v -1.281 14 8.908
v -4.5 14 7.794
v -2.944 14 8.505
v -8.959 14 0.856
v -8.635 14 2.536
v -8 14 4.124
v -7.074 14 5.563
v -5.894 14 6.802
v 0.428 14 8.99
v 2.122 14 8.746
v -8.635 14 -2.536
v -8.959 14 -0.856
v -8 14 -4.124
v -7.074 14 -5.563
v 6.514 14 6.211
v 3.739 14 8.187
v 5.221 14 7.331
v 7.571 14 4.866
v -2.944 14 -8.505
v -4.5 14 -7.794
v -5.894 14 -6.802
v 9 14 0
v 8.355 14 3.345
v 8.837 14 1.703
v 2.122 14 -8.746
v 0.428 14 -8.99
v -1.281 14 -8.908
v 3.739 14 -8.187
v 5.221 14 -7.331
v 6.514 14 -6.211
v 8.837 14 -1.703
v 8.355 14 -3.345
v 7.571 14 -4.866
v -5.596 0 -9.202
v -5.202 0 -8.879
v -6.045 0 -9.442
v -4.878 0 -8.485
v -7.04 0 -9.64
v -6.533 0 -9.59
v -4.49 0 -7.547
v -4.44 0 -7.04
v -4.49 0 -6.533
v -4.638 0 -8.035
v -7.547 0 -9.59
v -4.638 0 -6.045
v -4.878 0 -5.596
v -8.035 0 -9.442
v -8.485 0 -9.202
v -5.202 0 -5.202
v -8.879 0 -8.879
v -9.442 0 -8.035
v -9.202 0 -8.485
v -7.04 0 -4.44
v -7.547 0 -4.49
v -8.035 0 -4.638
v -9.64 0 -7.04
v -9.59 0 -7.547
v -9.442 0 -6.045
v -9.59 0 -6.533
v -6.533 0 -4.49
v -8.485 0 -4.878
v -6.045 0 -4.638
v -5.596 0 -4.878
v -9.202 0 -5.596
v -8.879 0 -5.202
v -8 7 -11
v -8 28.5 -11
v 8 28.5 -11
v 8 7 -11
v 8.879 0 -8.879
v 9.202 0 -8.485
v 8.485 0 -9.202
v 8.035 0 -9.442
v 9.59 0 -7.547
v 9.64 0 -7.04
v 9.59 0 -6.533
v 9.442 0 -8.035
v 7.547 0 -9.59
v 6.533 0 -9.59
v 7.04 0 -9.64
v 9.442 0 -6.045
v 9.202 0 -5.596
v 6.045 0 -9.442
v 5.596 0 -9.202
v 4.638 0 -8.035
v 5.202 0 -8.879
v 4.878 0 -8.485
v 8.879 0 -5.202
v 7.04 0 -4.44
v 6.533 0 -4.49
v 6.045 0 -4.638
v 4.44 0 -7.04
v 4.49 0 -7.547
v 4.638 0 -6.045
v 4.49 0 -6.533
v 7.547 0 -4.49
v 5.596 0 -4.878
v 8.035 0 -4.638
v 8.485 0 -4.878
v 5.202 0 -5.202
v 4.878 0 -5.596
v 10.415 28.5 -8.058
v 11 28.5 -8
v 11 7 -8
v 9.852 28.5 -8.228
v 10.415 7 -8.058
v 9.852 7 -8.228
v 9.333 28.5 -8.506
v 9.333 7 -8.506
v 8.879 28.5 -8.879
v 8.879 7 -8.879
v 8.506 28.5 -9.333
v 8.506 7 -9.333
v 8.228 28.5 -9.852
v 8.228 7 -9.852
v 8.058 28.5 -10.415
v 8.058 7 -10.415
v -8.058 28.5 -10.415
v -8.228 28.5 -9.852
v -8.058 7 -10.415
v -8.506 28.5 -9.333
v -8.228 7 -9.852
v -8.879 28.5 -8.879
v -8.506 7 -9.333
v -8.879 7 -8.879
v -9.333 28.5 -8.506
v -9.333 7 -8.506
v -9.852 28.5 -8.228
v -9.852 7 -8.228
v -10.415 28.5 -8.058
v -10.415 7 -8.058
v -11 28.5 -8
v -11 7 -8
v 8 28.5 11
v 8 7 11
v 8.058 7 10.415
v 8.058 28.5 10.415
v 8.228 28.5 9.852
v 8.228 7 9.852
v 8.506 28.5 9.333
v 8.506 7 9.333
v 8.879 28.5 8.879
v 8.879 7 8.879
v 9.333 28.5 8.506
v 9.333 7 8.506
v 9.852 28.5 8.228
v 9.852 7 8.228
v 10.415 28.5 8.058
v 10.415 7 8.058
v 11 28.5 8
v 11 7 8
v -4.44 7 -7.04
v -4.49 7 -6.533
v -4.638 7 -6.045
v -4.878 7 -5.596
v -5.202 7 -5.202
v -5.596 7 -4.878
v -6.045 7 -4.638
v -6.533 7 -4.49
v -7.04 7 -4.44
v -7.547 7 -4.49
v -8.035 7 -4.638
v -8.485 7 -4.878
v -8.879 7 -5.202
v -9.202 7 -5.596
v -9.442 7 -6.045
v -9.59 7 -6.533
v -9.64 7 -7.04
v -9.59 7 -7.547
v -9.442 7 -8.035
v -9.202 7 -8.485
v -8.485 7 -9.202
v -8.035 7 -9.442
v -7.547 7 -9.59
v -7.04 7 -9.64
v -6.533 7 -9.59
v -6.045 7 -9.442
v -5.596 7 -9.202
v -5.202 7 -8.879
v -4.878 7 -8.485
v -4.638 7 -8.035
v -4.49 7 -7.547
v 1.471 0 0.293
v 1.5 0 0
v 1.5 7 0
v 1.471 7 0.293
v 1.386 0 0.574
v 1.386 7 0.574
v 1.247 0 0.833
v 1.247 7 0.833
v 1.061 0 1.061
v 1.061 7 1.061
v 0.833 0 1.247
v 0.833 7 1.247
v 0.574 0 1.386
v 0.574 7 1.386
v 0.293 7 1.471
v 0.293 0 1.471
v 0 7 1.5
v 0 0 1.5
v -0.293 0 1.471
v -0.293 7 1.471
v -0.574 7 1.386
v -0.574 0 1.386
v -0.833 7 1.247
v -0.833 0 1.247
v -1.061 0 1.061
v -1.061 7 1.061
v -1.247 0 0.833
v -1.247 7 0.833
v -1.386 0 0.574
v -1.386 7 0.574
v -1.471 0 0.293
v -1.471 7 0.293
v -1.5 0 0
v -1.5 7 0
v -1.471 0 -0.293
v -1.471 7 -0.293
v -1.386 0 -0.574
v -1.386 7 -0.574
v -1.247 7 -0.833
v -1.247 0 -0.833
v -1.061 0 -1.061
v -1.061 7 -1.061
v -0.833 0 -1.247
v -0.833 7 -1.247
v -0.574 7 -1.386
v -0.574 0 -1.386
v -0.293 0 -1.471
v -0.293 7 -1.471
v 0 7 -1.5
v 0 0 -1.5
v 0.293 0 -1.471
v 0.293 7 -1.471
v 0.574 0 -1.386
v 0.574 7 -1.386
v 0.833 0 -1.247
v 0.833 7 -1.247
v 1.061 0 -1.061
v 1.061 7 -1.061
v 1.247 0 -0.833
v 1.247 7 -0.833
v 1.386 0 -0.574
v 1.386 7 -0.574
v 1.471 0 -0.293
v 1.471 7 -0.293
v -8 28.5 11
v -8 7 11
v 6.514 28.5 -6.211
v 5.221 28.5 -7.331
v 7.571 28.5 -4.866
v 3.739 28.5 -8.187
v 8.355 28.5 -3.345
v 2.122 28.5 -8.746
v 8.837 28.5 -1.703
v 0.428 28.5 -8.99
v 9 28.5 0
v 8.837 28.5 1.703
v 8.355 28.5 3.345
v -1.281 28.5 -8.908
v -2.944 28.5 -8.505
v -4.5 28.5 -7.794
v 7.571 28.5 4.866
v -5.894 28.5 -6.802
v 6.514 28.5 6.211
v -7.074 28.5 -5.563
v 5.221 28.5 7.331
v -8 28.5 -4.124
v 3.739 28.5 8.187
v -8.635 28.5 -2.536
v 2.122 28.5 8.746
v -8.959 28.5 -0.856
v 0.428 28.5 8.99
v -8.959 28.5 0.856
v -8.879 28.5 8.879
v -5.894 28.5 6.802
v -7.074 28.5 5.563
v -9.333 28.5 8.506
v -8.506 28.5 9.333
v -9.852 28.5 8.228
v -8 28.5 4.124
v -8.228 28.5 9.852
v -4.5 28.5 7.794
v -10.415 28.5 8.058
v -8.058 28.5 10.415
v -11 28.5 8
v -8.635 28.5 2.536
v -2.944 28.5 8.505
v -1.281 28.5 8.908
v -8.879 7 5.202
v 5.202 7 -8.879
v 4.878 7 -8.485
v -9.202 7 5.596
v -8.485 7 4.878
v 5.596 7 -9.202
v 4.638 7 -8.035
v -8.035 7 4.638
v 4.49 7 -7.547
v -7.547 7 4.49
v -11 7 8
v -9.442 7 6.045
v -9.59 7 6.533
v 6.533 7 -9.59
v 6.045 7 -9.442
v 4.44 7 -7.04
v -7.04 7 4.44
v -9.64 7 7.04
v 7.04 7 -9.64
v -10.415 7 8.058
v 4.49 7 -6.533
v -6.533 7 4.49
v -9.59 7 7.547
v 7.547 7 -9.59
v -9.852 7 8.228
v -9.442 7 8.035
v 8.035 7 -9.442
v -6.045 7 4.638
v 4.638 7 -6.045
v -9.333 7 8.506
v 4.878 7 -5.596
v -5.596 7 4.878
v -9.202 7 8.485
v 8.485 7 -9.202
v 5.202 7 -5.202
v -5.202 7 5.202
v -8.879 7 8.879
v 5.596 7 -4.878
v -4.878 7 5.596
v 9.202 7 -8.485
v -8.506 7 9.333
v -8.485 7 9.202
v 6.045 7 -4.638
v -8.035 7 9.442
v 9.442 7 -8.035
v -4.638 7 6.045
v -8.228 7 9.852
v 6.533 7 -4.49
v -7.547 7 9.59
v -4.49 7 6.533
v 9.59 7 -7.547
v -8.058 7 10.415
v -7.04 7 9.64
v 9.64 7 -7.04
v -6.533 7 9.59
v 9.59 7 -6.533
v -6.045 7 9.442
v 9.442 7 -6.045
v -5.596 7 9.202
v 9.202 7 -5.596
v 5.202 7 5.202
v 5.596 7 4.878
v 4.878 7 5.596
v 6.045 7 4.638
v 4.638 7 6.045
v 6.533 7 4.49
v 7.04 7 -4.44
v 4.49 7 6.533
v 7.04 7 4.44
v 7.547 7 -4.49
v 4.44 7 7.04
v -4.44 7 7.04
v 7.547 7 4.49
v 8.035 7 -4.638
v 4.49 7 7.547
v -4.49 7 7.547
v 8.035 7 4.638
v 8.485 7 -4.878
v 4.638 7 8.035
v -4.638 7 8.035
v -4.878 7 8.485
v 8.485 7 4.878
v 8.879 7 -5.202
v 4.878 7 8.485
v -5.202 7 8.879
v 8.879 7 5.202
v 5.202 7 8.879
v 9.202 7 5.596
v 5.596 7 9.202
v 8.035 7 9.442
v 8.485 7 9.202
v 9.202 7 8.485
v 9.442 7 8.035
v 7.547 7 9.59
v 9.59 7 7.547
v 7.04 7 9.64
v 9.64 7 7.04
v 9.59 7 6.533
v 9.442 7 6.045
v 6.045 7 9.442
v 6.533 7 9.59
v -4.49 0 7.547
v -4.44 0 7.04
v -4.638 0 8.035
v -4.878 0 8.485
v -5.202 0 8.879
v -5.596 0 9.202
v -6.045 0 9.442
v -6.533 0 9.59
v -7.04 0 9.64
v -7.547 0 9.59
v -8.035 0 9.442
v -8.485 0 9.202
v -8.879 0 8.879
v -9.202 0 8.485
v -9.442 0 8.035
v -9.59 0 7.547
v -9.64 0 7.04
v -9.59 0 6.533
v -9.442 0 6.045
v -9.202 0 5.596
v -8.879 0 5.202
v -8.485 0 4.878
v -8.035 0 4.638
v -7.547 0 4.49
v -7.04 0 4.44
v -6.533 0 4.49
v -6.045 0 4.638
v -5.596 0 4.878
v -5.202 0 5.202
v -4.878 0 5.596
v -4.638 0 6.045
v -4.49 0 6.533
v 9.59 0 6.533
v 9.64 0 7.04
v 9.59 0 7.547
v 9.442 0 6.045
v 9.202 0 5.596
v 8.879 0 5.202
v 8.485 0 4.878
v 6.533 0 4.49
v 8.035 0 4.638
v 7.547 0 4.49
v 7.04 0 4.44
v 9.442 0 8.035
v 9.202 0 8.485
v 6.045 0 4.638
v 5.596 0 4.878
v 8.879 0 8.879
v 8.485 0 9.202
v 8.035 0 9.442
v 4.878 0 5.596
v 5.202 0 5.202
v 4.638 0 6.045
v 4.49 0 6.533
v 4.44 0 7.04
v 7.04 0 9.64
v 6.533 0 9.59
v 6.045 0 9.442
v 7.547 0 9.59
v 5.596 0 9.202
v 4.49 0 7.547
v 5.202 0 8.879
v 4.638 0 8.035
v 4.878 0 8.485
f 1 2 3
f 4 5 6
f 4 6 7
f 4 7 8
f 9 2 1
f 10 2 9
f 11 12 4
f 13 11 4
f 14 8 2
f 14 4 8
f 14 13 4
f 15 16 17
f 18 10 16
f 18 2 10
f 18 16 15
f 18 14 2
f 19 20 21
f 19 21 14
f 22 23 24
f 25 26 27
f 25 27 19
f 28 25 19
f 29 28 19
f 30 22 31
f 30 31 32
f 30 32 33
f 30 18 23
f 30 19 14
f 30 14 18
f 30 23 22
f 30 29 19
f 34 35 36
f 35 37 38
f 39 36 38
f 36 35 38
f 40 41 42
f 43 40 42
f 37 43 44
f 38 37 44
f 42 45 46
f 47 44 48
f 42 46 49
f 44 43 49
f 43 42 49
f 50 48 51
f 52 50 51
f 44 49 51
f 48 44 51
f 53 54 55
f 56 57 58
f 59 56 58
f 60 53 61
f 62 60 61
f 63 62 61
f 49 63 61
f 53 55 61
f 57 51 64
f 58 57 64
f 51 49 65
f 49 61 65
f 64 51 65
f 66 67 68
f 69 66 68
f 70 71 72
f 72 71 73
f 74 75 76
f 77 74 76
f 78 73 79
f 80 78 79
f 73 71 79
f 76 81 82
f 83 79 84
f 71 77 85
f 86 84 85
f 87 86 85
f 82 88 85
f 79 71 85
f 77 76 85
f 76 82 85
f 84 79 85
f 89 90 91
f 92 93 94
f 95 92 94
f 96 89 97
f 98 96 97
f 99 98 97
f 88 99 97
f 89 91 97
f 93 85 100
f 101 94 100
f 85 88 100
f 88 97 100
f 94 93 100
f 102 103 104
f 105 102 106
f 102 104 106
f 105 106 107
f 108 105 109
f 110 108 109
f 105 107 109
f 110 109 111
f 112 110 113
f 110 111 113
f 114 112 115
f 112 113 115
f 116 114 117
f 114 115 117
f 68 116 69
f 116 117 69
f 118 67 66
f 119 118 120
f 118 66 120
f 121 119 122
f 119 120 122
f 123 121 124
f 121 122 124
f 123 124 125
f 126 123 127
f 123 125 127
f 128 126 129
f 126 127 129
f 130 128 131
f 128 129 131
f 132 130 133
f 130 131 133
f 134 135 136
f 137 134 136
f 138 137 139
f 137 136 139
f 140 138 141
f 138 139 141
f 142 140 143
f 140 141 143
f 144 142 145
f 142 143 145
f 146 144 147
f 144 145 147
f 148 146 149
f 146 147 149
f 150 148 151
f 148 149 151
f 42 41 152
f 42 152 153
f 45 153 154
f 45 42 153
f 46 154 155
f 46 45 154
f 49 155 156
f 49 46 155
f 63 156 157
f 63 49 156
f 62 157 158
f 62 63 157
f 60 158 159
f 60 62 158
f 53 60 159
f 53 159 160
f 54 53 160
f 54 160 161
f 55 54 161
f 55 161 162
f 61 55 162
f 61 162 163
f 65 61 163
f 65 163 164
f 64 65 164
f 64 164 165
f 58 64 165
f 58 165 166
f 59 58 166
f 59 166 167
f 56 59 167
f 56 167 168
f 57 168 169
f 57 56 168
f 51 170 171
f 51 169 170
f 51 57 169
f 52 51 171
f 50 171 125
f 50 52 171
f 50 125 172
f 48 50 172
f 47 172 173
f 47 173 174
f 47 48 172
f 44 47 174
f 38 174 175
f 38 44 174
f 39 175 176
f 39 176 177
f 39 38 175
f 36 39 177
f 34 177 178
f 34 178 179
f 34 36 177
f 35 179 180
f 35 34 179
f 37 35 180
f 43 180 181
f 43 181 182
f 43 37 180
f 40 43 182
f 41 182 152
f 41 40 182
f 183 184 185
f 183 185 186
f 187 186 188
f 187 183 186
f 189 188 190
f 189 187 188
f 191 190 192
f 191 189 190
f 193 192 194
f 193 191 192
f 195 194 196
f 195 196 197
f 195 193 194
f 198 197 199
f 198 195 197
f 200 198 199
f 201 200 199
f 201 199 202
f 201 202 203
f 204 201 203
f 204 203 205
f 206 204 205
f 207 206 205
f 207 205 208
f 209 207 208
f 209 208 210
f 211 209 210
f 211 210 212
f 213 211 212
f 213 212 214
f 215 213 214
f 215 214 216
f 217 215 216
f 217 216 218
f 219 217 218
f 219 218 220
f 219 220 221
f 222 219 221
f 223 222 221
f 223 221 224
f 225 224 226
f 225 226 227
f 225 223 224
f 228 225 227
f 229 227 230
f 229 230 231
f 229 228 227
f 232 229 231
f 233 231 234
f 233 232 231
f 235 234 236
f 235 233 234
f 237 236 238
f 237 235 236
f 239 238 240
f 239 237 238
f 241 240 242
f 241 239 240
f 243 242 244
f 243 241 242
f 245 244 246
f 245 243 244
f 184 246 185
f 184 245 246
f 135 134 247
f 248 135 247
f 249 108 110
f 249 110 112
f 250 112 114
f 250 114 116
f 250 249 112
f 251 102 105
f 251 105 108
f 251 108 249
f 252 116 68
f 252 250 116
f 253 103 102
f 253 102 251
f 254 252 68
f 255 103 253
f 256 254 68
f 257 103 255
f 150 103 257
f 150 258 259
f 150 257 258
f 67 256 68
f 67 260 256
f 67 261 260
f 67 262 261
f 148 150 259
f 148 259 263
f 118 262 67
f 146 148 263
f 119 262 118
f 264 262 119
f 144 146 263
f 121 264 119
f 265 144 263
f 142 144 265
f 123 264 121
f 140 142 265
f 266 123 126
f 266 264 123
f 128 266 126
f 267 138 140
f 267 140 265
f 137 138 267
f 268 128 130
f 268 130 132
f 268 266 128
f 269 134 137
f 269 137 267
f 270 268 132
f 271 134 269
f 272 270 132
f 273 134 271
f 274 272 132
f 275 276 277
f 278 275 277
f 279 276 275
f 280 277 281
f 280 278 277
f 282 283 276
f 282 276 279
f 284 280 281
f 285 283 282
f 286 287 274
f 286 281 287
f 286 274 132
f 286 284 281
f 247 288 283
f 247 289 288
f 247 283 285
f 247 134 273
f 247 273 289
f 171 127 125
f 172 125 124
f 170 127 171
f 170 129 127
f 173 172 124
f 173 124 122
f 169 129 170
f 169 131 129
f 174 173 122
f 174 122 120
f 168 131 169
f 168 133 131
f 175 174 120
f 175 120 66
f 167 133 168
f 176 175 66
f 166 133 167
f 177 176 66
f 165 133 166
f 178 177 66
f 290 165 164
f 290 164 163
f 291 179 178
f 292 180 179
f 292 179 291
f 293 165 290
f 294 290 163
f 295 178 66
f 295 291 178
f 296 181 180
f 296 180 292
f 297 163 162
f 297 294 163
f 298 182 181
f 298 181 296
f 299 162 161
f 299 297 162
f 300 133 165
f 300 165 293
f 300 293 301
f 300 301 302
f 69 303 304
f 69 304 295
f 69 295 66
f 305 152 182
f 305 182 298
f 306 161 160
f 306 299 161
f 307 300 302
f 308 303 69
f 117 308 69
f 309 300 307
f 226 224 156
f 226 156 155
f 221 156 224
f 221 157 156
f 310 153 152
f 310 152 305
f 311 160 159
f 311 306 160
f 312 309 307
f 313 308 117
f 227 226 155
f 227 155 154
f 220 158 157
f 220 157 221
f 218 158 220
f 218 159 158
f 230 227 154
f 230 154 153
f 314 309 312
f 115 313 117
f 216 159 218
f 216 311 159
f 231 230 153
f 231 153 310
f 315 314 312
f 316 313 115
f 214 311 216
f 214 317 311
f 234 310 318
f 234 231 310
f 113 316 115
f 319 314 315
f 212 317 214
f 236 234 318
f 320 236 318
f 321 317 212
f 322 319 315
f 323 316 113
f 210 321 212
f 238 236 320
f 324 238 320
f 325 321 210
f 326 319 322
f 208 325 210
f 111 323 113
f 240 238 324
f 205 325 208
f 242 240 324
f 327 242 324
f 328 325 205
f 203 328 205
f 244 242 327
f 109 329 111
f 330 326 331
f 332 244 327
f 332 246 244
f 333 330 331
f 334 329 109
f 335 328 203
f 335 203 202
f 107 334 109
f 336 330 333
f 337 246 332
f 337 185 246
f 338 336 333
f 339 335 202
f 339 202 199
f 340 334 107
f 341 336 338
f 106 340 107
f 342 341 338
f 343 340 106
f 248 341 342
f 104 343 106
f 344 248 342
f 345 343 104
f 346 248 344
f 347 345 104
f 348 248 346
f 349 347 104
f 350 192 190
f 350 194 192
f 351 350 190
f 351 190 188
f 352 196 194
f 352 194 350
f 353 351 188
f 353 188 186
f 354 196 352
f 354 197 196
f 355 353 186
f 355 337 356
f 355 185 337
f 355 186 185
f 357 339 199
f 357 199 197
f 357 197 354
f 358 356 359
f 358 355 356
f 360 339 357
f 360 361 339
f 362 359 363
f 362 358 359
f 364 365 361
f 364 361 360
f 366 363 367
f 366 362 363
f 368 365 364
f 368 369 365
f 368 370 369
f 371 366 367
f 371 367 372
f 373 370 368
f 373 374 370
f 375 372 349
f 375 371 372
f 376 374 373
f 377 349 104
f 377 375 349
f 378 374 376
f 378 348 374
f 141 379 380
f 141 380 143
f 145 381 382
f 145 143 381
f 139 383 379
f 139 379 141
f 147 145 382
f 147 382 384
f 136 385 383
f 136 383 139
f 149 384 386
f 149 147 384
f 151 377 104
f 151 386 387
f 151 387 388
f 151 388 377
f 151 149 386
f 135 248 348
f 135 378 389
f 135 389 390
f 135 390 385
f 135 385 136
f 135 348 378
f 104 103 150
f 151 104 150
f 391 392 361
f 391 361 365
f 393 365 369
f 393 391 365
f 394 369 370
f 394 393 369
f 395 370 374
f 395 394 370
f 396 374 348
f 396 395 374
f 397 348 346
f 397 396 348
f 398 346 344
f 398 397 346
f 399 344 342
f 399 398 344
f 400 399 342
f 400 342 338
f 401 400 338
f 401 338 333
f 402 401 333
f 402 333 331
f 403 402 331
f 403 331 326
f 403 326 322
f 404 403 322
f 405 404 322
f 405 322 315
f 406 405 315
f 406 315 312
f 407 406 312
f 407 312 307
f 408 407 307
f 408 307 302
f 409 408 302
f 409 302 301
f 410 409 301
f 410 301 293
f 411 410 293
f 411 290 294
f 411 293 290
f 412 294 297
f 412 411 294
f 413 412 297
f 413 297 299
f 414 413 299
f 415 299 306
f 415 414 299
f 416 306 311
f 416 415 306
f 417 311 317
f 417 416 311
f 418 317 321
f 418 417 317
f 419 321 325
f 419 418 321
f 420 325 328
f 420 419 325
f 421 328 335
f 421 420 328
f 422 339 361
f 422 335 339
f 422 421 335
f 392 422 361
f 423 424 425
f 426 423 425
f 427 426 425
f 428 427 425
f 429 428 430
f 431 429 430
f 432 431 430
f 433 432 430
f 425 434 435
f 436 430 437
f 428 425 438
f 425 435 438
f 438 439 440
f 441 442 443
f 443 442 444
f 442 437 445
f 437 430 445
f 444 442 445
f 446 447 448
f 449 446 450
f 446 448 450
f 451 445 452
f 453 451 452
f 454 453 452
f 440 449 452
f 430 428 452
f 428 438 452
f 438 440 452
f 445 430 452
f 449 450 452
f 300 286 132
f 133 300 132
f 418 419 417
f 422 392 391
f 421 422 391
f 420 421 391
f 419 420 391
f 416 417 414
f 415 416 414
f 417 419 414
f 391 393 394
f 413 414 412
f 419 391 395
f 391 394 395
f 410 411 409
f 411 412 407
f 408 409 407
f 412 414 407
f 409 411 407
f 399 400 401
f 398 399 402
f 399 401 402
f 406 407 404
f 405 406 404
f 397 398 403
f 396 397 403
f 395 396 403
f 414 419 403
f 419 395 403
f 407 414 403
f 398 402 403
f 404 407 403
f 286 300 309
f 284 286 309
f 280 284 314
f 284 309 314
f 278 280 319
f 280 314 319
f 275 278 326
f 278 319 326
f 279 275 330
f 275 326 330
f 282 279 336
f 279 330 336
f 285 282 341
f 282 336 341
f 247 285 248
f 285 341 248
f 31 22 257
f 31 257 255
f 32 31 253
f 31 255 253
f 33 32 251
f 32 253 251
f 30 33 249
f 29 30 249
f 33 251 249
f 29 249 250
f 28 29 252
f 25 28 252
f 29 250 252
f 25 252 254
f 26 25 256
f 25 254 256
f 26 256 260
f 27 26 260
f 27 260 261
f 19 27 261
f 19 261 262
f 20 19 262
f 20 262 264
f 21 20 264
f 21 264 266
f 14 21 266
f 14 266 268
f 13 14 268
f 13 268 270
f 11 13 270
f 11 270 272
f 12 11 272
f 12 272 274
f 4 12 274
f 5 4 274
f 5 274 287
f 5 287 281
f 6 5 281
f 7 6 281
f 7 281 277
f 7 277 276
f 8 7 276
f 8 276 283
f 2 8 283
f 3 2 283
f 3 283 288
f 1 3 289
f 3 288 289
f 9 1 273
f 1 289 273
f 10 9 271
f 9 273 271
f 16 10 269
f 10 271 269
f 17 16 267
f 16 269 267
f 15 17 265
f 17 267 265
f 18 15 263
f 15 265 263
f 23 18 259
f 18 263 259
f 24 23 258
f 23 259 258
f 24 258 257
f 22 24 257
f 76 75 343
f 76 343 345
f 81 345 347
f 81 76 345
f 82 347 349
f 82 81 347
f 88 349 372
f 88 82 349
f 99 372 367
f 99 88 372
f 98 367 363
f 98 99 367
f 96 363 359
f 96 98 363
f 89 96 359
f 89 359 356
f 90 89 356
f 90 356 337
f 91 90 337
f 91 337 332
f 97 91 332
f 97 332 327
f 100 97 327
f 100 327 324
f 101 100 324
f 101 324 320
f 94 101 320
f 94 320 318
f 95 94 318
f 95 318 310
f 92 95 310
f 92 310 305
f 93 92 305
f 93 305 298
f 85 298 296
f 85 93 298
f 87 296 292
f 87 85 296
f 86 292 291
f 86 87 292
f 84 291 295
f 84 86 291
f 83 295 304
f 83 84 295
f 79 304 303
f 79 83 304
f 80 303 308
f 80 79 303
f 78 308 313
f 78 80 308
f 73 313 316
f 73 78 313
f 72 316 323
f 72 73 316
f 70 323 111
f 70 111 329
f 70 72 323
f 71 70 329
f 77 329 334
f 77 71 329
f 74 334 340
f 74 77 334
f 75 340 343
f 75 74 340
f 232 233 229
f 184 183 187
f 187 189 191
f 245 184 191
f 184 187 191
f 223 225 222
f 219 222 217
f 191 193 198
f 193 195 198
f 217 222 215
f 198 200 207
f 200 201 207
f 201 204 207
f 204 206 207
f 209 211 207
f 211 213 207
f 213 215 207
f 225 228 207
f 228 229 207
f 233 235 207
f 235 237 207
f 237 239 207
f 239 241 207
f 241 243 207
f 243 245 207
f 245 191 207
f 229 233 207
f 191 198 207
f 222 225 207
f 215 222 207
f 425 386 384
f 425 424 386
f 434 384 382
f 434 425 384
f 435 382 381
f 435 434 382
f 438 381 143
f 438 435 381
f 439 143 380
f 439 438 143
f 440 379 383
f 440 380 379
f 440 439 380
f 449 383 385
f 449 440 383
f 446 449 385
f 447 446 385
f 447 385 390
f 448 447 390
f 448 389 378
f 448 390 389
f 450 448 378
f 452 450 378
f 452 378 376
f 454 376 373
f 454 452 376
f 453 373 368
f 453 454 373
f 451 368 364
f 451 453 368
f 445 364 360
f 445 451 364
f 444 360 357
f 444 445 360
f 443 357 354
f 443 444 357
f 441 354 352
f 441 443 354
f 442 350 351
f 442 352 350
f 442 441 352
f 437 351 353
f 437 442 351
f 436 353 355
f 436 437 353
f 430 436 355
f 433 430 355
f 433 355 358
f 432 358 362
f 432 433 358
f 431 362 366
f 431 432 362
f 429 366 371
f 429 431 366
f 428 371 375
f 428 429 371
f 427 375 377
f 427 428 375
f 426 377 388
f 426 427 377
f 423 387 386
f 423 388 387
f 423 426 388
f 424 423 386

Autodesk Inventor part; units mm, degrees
ref_plane "YZ Plane" through (0, 0, 0) normal (1, 0, 0) x (0, 1, 0)
ref_plane "XZ Plane" through (0, 0, 0) normal (0, 1, 0) x (-1, 0, 0)
ref_plane "XY Plane" through (0, 0, 0) normal (0, 0, 1) x (1, 0, 0)
sketch "Sketch1" plane through (0, 0, 0) normal (0, 1, 0) x (-1, 0, 0)
  line L0 (-11, 11) -> (11, 11)
  line L1 (11, 11) -> (11, -11)
  line L2 (11, -11) -> (-11, -11)
  line L3 (-11, -11) -> (-11, 11)
  line L4 (-11, 11) -> (11, -11) construction
  line L5 (11, 11) -> (-11, -11) construction
  point P0 (0, 0)
  dimension "d0" = 22
  dimension "d1" = 22
extrude "Extrusion1" add sketch "Sketch1" along normal blind 28.5
sketch "Sketch2" plane through (0, 28.5, 0) normal (0, 1, 0) x (1, 0, 0)
  circle A0 centre (0, 0) radius 9
  dimension "d4" = 18
extrude "Extrusion2" cut sketch "Sketch2" against normal blind 14.5
sketch "Sketch3" plane through (0, 0, 0) normal (0, -1, 0) x (1, 0, 0)
  line L0 (11, 11) -> (-11, 11) projected
  line L1 (-11, 11) -> (-11, -11) projected
  line L2 (-11, -11) -> (11, -11) projected
  line L3 (11, -11) -> (11, 11) projected
  line L4 (11, 11) -> (11, -11) projected
  circle A0 centre (11, -11) radius 3
  line L5 (11, -11) -> (-11, -11) projected
  circle A1 centre (-11, -11) radius 3
  line L6 (-11, 11) -> (11, 11) projected
  circle A2 centre (-11, 11) radius 3
  circle A3 centre (11, 11) radius 3
  point P0 (0, 0)
  dimension "d7" = 6
  dimension "d8" = 6
  dimension "d9" = 6
  dimension "d10" = 6
extrude "Extrusion3" cut sketch "Sketch3" against normal through all contours A2 L1 L0 | L0 L1 A2 | A3 L3 L0 | L0 L3 A3 | A1 L2 L1 | L1 L2 A1 | A0 L2 L3 | L3 L2 A0
sketch "Sketch4" plane through (0, 0, 0) normal (0, -1, 0) x (1, 0, 0)
  circle A0 centre (0, 0) radius 1.5
  arc A1 (8, 11) -> (11, 8) centre (11, 11) ccw projected
  line L0 (8, 11) -> (-8, 11) projected
  arc A2 (-11, 8) -> (-8, 11) centre (-11, 11) ccw projected
  line L1 (-11, 8) -> (-11, -8) projected
  arc A3 (-8, -11) -> (-11, -8) centre (-11, -11) ccw projected
  line L2 (-8, -11) -> (8, -11) projected
  arc A4 (11, -8) -> (8, -11) centre (11, -11) ccw projected
  line L3 (11, -8) -> (11, 8) projected
  line L4 (7.0402, 7.0402) -> (4.4402, 7.0402)
  line L5 (-7.0402, 7.0402) -> (-7.0402, 4.4402)
  line L6 (-7.0402, -7.0402) -> (-4.4402, -7.0402)
  line L7 (7.0402, -7.0402) -> (7.0402, -4.4402)
  line L8 (7.0402, 7.0402) -> (-7.0402, -7.0402) construction
  line L9 (-7.0402, 7.0402) -> (7.0402, -7.0402) construction
  circle A5 centre (-7.0402, -7.0402) radius 2.6
  circle A6 centre (-7.0402, 7.0402) radius 2.6
  circle A7 centre (7.0402, 7.0402) radius 2.6
  circle A8 centre (7.0402, -7.0402) radius 2.6
  line L10 (-4.4402, -7.0402) -> (4.4402, -7.0402)
  line L11 (-7.0402, 4.4402) -> (-7.0402, -4.4402)
  line L12 (-7.0402, -4.4402) -> (-7.0402, -7.0402)
  line L13 (4.4402, -7.0402) -> (7.0402, -7.0402)
  line L14 (7.0402, -4.4402) -> (7.0402, 4.4402)
  line L15 (7.0402, 4.4402) -> (7.0402, 7.0402)
  line L16 (4.4402, 7.0402) -> (-4.4402, 7.0402)
  line L17 (-4.4402, 7.0402) -> (-7.0402, 7.0402)
  dimension "d13" = 3
  dimension "d15" = 14.0804
  dimension "d16" = 5.2
  dimension "d17" = 5.2
  dimension "d18" = 5.2
  dimension "d19" = 5.2
  dimension "d20" = 14.0804
extrude "Extrusion4" cut sketch "Sketch4" against normal blind 7 contours A1 A7 L16 A6 A2 L0 | A1 L3 A4 A8 L14 A7 | A7 L14 A8 L10 A5 L11 A6 L16 | A6 L11 A5 A3 L1 A2 | A4 L2 A3 A5 L10 A8
equation "\"d1\" = d0"
equation "\"d15\" = d20"
equation "\"d17\" = d16"
equation "\"d18\" = d17"
equation "\"d19\" = d18"
properties part number "VRUZEND_Caps"
